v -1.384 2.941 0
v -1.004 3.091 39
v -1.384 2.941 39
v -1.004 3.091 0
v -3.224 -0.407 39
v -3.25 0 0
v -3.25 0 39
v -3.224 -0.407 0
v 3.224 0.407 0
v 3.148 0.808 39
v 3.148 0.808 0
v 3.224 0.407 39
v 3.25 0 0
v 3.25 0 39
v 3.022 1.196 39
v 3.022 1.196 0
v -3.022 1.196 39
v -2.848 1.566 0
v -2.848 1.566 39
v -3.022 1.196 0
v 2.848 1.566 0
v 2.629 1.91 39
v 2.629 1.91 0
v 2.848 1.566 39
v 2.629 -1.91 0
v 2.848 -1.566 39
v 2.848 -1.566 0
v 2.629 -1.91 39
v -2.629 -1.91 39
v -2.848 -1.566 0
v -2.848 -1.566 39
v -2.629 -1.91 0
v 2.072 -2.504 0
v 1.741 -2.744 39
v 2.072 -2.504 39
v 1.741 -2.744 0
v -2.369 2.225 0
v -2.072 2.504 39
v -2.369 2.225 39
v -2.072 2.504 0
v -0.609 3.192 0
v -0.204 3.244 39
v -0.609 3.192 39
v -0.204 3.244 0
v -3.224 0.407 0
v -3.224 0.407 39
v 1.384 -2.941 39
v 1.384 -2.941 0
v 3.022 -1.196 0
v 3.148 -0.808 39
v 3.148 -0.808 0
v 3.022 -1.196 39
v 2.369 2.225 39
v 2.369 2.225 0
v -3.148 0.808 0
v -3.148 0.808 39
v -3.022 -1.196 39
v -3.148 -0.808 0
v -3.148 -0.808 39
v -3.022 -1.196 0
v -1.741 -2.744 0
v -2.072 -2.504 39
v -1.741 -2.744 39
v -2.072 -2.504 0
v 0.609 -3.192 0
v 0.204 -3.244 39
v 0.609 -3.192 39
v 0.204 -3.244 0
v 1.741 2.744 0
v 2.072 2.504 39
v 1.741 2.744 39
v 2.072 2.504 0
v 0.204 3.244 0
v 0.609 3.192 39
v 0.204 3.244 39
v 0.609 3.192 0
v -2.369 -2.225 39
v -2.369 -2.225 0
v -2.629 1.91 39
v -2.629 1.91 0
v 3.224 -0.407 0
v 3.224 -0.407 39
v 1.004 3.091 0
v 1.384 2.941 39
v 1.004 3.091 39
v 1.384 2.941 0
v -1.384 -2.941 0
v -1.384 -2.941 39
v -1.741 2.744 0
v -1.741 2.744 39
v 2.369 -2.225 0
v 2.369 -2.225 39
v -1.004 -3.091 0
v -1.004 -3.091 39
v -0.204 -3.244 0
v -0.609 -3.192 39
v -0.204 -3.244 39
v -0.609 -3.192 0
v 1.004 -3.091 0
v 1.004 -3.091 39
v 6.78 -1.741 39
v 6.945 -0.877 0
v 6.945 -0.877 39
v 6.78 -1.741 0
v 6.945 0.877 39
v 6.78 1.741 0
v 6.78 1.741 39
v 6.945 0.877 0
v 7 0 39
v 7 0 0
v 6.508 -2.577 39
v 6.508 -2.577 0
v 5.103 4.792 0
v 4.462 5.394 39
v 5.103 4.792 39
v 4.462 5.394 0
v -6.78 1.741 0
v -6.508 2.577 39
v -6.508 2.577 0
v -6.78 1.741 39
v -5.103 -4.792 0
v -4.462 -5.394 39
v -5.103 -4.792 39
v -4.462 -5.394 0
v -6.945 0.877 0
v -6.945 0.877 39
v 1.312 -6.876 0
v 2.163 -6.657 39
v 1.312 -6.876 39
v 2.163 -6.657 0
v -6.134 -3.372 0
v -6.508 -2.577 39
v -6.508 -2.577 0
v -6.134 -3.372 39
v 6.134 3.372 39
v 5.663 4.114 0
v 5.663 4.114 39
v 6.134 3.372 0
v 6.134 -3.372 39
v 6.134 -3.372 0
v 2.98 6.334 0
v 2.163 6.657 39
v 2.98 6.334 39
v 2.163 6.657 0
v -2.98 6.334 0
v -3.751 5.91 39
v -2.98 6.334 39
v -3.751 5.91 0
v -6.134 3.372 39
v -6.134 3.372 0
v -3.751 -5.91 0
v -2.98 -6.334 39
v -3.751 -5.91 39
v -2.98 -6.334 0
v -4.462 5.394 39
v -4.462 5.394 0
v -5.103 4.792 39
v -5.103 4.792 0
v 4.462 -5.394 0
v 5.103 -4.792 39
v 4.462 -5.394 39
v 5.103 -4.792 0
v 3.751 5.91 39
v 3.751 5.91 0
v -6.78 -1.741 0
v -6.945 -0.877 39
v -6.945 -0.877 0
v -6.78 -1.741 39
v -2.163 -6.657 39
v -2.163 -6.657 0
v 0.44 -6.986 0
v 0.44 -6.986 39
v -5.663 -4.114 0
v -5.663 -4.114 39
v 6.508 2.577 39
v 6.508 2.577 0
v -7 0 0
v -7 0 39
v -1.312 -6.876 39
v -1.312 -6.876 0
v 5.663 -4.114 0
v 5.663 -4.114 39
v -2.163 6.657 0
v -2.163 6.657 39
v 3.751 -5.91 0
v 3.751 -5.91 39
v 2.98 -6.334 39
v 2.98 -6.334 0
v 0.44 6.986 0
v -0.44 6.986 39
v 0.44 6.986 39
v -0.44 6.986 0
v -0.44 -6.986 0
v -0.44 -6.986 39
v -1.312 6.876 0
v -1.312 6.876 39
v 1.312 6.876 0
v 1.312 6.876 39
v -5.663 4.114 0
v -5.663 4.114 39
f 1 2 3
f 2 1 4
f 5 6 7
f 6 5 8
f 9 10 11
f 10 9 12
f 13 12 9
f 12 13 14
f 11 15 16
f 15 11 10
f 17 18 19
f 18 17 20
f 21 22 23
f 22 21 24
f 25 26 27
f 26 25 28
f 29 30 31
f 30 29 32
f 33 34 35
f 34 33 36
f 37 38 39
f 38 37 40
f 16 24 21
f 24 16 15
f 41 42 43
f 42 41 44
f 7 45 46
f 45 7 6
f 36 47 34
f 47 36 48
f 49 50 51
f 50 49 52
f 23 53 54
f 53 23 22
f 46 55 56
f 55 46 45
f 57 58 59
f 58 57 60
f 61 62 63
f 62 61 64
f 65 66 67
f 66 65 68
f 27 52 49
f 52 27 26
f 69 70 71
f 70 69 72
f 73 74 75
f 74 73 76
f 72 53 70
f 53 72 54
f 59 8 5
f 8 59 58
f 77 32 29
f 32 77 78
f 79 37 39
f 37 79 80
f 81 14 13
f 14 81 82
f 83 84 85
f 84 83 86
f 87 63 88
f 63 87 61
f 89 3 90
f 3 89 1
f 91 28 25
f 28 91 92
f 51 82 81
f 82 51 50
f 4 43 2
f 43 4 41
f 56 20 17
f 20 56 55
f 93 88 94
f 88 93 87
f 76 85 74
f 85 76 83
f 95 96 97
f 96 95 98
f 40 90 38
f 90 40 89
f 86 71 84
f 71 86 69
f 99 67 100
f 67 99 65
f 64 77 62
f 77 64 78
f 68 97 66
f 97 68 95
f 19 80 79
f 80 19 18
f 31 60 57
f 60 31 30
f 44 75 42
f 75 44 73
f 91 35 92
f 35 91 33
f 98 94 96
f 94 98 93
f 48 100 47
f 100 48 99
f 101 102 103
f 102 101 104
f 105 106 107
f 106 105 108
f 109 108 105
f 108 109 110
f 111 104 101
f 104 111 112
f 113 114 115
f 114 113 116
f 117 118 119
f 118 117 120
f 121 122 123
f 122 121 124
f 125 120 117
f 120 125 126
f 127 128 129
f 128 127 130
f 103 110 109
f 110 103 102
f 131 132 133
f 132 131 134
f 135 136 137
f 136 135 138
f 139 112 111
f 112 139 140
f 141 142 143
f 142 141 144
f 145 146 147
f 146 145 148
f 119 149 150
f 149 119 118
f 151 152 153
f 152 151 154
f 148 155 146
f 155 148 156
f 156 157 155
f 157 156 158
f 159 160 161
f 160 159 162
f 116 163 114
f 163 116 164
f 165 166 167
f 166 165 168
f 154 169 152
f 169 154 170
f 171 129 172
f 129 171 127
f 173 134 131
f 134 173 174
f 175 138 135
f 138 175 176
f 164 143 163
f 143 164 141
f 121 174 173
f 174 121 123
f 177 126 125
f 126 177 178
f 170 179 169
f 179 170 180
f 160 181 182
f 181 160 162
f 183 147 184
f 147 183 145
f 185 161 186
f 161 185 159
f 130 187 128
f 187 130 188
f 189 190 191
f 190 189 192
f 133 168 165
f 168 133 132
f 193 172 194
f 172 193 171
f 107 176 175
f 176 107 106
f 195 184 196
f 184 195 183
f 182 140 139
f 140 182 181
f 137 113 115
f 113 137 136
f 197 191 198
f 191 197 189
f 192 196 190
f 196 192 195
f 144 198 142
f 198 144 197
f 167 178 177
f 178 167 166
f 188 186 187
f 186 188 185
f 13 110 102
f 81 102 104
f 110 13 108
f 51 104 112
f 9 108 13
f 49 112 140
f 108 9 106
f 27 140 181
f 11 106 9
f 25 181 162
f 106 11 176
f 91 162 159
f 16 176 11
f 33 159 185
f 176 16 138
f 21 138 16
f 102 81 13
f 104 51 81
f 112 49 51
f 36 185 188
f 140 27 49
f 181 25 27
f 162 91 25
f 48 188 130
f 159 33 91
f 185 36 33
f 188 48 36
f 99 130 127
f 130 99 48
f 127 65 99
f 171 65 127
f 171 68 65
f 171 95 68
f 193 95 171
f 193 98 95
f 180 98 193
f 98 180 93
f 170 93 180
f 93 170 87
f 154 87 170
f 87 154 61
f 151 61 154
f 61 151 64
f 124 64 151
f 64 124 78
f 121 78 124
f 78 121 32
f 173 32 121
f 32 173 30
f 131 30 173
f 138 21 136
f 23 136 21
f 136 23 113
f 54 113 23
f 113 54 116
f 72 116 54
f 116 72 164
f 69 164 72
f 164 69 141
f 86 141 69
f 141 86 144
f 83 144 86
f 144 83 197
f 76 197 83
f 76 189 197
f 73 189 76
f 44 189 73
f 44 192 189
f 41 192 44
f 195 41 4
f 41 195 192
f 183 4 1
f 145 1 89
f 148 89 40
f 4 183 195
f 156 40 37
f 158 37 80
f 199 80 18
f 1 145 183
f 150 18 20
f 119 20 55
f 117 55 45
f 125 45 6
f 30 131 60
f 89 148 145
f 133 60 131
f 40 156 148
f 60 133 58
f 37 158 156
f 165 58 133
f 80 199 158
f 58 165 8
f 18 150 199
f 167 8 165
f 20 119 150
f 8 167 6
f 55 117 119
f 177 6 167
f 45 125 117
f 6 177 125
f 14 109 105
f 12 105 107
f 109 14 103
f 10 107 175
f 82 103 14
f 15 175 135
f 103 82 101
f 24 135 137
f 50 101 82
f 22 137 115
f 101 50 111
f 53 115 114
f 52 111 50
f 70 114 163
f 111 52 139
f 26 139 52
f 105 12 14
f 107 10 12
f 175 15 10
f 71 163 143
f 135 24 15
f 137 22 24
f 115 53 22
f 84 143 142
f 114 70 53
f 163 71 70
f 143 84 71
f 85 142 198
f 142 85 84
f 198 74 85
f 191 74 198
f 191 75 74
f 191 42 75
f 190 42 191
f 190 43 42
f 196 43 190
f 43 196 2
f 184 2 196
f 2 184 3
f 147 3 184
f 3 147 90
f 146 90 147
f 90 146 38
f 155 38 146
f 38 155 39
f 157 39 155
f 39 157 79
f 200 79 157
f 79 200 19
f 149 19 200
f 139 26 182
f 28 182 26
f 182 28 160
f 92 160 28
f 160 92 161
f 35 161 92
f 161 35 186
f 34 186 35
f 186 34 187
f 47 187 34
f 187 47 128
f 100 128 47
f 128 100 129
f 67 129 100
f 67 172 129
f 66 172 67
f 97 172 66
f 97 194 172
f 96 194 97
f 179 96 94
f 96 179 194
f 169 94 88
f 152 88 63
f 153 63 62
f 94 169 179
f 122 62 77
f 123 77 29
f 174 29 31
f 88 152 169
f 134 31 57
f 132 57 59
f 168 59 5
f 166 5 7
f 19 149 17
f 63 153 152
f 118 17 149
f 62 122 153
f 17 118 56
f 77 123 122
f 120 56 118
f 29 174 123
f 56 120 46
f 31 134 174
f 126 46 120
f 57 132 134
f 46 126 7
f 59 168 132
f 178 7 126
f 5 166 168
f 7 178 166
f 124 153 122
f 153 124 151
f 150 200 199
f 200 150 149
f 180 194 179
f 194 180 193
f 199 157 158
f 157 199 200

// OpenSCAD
$fn = 50;


difference() {
	union() {
		cylinder(h = 39, r = 7.0000000000);
	}
	union() {
		translate(v = [0.0000000000, 0.0000000000, -100.0000000000]) {
			cylinder(h = 200, r = 3.2500000000);
		}
		cylinder(h = 39, r = 1.8000000000);
		cylinder(h = 39, r = 1.8000000000);
		cylinder(h = 39, r = 1.8000000000);
	}
}
